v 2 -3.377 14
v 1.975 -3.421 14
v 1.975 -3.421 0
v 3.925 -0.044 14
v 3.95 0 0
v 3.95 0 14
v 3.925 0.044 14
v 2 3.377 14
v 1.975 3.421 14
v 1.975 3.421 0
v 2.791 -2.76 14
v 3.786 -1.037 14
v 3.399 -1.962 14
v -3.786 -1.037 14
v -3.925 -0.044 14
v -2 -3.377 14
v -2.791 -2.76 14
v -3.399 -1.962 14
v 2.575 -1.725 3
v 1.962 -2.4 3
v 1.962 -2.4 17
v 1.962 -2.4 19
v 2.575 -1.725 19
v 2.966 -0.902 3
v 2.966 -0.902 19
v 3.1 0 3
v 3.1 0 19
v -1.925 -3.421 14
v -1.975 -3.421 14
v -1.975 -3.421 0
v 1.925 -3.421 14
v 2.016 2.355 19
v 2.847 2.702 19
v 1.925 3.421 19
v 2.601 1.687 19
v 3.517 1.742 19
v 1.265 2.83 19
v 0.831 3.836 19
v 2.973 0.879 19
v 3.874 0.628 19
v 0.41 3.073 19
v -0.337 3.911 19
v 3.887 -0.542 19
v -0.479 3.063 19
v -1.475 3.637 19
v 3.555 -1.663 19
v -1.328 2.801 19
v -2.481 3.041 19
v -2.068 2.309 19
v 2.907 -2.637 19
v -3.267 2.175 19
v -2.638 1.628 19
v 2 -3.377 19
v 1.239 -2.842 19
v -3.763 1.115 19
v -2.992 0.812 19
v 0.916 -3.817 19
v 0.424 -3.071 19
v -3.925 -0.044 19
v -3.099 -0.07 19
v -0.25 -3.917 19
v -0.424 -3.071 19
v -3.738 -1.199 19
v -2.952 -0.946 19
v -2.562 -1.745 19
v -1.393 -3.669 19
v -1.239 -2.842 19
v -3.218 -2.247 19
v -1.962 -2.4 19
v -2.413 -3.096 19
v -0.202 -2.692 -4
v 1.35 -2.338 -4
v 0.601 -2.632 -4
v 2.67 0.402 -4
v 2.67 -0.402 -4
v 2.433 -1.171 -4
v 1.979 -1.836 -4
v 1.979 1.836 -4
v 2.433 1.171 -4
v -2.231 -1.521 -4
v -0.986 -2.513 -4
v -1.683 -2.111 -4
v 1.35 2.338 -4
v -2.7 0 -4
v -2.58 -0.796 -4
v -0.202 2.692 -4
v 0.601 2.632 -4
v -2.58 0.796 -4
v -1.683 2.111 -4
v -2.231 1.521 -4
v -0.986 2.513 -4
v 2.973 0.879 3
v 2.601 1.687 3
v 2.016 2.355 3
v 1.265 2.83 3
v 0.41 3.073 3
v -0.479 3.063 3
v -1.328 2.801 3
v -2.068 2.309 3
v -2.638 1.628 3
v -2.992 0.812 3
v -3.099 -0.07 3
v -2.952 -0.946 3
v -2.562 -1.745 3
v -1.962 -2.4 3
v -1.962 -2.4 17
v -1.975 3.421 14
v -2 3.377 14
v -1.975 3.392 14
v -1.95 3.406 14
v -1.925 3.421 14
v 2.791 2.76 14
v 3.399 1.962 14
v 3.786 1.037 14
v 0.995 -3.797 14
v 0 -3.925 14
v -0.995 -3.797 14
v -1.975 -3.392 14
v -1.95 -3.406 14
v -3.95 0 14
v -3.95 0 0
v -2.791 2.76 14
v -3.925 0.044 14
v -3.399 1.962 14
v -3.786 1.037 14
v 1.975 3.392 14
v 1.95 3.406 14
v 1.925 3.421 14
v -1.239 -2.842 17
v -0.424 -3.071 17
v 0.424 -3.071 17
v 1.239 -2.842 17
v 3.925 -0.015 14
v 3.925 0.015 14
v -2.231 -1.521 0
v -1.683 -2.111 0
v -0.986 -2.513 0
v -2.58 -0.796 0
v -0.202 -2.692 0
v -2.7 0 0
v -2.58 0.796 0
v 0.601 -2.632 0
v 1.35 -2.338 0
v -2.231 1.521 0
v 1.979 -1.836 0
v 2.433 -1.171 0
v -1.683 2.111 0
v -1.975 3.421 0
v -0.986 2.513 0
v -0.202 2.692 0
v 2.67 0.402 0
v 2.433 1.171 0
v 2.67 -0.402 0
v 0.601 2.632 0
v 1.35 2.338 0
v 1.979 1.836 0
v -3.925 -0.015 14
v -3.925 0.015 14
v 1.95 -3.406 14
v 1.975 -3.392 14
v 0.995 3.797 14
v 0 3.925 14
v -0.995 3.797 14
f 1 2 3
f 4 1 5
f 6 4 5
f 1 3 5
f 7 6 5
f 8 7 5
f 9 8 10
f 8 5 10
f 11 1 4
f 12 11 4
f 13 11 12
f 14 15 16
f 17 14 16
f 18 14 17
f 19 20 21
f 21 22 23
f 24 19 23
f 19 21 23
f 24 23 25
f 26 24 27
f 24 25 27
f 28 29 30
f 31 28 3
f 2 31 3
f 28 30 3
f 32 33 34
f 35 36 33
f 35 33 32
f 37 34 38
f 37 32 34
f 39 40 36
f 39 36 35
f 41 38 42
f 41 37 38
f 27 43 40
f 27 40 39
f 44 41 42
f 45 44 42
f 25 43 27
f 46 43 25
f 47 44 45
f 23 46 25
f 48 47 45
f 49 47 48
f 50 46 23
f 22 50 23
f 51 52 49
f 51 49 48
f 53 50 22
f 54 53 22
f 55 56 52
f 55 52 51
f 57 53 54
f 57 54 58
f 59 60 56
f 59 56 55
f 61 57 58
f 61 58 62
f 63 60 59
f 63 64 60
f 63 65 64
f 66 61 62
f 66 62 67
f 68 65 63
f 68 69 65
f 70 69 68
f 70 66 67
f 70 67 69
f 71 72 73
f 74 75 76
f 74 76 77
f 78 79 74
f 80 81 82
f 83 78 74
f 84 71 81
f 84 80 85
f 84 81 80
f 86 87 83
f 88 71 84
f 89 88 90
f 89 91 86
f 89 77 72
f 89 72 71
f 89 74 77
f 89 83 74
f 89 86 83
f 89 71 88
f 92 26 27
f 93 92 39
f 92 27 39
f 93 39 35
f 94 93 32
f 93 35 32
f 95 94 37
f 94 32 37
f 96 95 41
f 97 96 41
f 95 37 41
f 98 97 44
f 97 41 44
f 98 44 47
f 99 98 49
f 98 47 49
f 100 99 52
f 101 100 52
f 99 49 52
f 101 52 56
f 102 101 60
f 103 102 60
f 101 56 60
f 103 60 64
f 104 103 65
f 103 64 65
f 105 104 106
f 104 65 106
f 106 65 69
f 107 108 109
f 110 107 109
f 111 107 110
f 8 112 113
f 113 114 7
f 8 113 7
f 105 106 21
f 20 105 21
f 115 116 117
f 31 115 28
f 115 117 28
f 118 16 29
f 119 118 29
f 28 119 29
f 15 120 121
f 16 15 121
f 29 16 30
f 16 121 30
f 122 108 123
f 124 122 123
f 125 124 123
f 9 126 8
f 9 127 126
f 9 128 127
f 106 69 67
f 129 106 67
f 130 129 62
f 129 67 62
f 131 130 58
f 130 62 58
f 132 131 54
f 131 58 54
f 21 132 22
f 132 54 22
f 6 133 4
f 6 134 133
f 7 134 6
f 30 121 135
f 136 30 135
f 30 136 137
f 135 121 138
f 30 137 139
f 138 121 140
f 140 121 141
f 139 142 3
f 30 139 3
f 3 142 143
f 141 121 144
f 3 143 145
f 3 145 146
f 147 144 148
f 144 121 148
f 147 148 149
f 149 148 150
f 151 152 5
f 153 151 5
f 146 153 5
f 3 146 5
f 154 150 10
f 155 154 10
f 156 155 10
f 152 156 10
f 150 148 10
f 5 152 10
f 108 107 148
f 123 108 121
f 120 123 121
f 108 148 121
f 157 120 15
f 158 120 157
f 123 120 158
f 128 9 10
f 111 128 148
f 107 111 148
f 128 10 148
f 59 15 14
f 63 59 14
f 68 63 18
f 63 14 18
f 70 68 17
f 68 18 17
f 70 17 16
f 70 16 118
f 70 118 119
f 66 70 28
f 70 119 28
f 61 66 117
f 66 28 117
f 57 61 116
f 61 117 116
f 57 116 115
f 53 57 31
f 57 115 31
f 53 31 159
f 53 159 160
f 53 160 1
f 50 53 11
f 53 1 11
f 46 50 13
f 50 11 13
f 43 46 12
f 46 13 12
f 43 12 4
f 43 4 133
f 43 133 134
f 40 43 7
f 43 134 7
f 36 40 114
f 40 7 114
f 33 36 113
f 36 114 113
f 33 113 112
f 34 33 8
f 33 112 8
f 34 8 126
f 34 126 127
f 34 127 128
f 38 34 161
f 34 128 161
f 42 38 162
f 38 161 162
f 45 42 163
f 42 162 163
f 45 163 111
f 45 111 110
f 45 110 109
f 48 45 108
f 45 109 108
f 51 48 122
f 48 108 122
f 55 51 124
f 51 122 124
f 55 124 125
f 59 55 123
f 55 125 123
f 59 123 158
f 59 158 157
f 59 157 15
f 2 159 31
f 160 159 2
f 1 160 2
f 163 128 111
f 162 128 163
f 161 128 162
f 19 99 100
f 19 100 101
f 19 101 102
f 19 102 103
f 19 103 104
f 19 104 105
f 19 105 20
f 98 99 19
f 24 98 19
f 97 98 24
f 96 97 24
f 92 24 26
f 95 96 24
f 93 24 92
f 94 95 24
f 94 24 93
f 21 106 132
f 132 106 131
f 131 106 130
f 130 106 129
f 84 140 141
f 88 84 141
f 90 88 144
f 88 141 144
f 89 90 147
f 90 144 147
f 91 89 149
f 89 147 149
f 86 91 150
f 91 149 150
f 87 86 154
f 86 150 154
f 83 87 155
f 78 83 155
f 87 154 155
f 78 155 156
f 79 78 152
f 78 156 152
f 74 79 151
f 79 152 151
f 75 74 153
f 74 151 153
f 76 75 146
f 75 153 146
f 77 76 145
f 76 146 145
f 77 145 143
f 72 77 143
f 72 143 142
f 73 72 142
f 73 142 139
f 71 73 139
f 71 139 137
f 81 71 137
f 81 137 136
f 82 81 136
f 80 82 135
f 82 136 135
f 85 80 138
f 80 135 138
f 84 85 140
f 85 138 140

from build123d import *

# Parameters (mm, degrees)
BOSS_EXTRUDE1_DEPTH = 14
SKETCH2_R           = 3.925
BOSS_EXTRUDE2_DEPTH = 5
SKETCH3_R           = 2.7
BOSS_EXTRUDE3_DEPTH = 4
CUT_EXTRUDE1_DEPTH  = 16
SKETCH5_R           = 3.1
CUT_EXTRUDE2_DEPTH  = 2


with BuildPart() as part:
    # Sketch1 → Boss-Extrude1 (new body)
    with BuildSketch(Plane.XY):
        Polygon((3.95, 0), (1.975, 3.420800345), (-1.975, 3.420800345), (-3.95, 0), (-1.975, -3.420800345), (1.975, -3.420800345), align=None)
    extrude(amount=BOSS_EXTRUDE1_DEPTH)

    # Sketch2 → Boss-Extrude2 (add)
    with BuildSketch(Plane.XY.offset(14)):
        with Locations(Location((0, 0, 0), (0, 0, 180.63826759))):
            Circle(SKETCH2_R)
    extrude(amount=BOSS_EXTRUDE2_DEPTH)

    # Sketch3 → Boss-Extrude3 (add)
    with BuildSketch(Plane(origin=(0, 0, 0), x_dir=(-1, 0, 0), z_dir=(0, 0, -1))):
        Circle(SKETCH3_R)
    extrude(amount=BOSS_EXTRUDE3_DEPTH)

    # Sketch4 → Cut-Extrude1 (cut)
    with BuildSketch(Plane.XY.offset(19)):
        with BuildLine():
            ThreePointArc((3.1, 0), (-1.328036289, 2.801128275), (-1.962141687, -2.4))
            Line((-1.962141687, -2.4), (1.962141687, -2.4))
            ThreePointArc((1.962141687, -2.4), (2.801128275, -1.328036289), (3.1, 0))
        make_face()
    extrude(amount=-CUT_EXTRUDE1_DEPTH, mode=Mode.SUBTRACT)

    # Sketch5 → Cut-Extrude2 (cut)
    with BuildSketch(Plane.XY.offset(19)):
        Circle(SKETCH5_R)
    extrude(amount=-CUT_EXTRUDE2_DEPTH, mode=Mode.SUBTRACT)


solid = part.part
